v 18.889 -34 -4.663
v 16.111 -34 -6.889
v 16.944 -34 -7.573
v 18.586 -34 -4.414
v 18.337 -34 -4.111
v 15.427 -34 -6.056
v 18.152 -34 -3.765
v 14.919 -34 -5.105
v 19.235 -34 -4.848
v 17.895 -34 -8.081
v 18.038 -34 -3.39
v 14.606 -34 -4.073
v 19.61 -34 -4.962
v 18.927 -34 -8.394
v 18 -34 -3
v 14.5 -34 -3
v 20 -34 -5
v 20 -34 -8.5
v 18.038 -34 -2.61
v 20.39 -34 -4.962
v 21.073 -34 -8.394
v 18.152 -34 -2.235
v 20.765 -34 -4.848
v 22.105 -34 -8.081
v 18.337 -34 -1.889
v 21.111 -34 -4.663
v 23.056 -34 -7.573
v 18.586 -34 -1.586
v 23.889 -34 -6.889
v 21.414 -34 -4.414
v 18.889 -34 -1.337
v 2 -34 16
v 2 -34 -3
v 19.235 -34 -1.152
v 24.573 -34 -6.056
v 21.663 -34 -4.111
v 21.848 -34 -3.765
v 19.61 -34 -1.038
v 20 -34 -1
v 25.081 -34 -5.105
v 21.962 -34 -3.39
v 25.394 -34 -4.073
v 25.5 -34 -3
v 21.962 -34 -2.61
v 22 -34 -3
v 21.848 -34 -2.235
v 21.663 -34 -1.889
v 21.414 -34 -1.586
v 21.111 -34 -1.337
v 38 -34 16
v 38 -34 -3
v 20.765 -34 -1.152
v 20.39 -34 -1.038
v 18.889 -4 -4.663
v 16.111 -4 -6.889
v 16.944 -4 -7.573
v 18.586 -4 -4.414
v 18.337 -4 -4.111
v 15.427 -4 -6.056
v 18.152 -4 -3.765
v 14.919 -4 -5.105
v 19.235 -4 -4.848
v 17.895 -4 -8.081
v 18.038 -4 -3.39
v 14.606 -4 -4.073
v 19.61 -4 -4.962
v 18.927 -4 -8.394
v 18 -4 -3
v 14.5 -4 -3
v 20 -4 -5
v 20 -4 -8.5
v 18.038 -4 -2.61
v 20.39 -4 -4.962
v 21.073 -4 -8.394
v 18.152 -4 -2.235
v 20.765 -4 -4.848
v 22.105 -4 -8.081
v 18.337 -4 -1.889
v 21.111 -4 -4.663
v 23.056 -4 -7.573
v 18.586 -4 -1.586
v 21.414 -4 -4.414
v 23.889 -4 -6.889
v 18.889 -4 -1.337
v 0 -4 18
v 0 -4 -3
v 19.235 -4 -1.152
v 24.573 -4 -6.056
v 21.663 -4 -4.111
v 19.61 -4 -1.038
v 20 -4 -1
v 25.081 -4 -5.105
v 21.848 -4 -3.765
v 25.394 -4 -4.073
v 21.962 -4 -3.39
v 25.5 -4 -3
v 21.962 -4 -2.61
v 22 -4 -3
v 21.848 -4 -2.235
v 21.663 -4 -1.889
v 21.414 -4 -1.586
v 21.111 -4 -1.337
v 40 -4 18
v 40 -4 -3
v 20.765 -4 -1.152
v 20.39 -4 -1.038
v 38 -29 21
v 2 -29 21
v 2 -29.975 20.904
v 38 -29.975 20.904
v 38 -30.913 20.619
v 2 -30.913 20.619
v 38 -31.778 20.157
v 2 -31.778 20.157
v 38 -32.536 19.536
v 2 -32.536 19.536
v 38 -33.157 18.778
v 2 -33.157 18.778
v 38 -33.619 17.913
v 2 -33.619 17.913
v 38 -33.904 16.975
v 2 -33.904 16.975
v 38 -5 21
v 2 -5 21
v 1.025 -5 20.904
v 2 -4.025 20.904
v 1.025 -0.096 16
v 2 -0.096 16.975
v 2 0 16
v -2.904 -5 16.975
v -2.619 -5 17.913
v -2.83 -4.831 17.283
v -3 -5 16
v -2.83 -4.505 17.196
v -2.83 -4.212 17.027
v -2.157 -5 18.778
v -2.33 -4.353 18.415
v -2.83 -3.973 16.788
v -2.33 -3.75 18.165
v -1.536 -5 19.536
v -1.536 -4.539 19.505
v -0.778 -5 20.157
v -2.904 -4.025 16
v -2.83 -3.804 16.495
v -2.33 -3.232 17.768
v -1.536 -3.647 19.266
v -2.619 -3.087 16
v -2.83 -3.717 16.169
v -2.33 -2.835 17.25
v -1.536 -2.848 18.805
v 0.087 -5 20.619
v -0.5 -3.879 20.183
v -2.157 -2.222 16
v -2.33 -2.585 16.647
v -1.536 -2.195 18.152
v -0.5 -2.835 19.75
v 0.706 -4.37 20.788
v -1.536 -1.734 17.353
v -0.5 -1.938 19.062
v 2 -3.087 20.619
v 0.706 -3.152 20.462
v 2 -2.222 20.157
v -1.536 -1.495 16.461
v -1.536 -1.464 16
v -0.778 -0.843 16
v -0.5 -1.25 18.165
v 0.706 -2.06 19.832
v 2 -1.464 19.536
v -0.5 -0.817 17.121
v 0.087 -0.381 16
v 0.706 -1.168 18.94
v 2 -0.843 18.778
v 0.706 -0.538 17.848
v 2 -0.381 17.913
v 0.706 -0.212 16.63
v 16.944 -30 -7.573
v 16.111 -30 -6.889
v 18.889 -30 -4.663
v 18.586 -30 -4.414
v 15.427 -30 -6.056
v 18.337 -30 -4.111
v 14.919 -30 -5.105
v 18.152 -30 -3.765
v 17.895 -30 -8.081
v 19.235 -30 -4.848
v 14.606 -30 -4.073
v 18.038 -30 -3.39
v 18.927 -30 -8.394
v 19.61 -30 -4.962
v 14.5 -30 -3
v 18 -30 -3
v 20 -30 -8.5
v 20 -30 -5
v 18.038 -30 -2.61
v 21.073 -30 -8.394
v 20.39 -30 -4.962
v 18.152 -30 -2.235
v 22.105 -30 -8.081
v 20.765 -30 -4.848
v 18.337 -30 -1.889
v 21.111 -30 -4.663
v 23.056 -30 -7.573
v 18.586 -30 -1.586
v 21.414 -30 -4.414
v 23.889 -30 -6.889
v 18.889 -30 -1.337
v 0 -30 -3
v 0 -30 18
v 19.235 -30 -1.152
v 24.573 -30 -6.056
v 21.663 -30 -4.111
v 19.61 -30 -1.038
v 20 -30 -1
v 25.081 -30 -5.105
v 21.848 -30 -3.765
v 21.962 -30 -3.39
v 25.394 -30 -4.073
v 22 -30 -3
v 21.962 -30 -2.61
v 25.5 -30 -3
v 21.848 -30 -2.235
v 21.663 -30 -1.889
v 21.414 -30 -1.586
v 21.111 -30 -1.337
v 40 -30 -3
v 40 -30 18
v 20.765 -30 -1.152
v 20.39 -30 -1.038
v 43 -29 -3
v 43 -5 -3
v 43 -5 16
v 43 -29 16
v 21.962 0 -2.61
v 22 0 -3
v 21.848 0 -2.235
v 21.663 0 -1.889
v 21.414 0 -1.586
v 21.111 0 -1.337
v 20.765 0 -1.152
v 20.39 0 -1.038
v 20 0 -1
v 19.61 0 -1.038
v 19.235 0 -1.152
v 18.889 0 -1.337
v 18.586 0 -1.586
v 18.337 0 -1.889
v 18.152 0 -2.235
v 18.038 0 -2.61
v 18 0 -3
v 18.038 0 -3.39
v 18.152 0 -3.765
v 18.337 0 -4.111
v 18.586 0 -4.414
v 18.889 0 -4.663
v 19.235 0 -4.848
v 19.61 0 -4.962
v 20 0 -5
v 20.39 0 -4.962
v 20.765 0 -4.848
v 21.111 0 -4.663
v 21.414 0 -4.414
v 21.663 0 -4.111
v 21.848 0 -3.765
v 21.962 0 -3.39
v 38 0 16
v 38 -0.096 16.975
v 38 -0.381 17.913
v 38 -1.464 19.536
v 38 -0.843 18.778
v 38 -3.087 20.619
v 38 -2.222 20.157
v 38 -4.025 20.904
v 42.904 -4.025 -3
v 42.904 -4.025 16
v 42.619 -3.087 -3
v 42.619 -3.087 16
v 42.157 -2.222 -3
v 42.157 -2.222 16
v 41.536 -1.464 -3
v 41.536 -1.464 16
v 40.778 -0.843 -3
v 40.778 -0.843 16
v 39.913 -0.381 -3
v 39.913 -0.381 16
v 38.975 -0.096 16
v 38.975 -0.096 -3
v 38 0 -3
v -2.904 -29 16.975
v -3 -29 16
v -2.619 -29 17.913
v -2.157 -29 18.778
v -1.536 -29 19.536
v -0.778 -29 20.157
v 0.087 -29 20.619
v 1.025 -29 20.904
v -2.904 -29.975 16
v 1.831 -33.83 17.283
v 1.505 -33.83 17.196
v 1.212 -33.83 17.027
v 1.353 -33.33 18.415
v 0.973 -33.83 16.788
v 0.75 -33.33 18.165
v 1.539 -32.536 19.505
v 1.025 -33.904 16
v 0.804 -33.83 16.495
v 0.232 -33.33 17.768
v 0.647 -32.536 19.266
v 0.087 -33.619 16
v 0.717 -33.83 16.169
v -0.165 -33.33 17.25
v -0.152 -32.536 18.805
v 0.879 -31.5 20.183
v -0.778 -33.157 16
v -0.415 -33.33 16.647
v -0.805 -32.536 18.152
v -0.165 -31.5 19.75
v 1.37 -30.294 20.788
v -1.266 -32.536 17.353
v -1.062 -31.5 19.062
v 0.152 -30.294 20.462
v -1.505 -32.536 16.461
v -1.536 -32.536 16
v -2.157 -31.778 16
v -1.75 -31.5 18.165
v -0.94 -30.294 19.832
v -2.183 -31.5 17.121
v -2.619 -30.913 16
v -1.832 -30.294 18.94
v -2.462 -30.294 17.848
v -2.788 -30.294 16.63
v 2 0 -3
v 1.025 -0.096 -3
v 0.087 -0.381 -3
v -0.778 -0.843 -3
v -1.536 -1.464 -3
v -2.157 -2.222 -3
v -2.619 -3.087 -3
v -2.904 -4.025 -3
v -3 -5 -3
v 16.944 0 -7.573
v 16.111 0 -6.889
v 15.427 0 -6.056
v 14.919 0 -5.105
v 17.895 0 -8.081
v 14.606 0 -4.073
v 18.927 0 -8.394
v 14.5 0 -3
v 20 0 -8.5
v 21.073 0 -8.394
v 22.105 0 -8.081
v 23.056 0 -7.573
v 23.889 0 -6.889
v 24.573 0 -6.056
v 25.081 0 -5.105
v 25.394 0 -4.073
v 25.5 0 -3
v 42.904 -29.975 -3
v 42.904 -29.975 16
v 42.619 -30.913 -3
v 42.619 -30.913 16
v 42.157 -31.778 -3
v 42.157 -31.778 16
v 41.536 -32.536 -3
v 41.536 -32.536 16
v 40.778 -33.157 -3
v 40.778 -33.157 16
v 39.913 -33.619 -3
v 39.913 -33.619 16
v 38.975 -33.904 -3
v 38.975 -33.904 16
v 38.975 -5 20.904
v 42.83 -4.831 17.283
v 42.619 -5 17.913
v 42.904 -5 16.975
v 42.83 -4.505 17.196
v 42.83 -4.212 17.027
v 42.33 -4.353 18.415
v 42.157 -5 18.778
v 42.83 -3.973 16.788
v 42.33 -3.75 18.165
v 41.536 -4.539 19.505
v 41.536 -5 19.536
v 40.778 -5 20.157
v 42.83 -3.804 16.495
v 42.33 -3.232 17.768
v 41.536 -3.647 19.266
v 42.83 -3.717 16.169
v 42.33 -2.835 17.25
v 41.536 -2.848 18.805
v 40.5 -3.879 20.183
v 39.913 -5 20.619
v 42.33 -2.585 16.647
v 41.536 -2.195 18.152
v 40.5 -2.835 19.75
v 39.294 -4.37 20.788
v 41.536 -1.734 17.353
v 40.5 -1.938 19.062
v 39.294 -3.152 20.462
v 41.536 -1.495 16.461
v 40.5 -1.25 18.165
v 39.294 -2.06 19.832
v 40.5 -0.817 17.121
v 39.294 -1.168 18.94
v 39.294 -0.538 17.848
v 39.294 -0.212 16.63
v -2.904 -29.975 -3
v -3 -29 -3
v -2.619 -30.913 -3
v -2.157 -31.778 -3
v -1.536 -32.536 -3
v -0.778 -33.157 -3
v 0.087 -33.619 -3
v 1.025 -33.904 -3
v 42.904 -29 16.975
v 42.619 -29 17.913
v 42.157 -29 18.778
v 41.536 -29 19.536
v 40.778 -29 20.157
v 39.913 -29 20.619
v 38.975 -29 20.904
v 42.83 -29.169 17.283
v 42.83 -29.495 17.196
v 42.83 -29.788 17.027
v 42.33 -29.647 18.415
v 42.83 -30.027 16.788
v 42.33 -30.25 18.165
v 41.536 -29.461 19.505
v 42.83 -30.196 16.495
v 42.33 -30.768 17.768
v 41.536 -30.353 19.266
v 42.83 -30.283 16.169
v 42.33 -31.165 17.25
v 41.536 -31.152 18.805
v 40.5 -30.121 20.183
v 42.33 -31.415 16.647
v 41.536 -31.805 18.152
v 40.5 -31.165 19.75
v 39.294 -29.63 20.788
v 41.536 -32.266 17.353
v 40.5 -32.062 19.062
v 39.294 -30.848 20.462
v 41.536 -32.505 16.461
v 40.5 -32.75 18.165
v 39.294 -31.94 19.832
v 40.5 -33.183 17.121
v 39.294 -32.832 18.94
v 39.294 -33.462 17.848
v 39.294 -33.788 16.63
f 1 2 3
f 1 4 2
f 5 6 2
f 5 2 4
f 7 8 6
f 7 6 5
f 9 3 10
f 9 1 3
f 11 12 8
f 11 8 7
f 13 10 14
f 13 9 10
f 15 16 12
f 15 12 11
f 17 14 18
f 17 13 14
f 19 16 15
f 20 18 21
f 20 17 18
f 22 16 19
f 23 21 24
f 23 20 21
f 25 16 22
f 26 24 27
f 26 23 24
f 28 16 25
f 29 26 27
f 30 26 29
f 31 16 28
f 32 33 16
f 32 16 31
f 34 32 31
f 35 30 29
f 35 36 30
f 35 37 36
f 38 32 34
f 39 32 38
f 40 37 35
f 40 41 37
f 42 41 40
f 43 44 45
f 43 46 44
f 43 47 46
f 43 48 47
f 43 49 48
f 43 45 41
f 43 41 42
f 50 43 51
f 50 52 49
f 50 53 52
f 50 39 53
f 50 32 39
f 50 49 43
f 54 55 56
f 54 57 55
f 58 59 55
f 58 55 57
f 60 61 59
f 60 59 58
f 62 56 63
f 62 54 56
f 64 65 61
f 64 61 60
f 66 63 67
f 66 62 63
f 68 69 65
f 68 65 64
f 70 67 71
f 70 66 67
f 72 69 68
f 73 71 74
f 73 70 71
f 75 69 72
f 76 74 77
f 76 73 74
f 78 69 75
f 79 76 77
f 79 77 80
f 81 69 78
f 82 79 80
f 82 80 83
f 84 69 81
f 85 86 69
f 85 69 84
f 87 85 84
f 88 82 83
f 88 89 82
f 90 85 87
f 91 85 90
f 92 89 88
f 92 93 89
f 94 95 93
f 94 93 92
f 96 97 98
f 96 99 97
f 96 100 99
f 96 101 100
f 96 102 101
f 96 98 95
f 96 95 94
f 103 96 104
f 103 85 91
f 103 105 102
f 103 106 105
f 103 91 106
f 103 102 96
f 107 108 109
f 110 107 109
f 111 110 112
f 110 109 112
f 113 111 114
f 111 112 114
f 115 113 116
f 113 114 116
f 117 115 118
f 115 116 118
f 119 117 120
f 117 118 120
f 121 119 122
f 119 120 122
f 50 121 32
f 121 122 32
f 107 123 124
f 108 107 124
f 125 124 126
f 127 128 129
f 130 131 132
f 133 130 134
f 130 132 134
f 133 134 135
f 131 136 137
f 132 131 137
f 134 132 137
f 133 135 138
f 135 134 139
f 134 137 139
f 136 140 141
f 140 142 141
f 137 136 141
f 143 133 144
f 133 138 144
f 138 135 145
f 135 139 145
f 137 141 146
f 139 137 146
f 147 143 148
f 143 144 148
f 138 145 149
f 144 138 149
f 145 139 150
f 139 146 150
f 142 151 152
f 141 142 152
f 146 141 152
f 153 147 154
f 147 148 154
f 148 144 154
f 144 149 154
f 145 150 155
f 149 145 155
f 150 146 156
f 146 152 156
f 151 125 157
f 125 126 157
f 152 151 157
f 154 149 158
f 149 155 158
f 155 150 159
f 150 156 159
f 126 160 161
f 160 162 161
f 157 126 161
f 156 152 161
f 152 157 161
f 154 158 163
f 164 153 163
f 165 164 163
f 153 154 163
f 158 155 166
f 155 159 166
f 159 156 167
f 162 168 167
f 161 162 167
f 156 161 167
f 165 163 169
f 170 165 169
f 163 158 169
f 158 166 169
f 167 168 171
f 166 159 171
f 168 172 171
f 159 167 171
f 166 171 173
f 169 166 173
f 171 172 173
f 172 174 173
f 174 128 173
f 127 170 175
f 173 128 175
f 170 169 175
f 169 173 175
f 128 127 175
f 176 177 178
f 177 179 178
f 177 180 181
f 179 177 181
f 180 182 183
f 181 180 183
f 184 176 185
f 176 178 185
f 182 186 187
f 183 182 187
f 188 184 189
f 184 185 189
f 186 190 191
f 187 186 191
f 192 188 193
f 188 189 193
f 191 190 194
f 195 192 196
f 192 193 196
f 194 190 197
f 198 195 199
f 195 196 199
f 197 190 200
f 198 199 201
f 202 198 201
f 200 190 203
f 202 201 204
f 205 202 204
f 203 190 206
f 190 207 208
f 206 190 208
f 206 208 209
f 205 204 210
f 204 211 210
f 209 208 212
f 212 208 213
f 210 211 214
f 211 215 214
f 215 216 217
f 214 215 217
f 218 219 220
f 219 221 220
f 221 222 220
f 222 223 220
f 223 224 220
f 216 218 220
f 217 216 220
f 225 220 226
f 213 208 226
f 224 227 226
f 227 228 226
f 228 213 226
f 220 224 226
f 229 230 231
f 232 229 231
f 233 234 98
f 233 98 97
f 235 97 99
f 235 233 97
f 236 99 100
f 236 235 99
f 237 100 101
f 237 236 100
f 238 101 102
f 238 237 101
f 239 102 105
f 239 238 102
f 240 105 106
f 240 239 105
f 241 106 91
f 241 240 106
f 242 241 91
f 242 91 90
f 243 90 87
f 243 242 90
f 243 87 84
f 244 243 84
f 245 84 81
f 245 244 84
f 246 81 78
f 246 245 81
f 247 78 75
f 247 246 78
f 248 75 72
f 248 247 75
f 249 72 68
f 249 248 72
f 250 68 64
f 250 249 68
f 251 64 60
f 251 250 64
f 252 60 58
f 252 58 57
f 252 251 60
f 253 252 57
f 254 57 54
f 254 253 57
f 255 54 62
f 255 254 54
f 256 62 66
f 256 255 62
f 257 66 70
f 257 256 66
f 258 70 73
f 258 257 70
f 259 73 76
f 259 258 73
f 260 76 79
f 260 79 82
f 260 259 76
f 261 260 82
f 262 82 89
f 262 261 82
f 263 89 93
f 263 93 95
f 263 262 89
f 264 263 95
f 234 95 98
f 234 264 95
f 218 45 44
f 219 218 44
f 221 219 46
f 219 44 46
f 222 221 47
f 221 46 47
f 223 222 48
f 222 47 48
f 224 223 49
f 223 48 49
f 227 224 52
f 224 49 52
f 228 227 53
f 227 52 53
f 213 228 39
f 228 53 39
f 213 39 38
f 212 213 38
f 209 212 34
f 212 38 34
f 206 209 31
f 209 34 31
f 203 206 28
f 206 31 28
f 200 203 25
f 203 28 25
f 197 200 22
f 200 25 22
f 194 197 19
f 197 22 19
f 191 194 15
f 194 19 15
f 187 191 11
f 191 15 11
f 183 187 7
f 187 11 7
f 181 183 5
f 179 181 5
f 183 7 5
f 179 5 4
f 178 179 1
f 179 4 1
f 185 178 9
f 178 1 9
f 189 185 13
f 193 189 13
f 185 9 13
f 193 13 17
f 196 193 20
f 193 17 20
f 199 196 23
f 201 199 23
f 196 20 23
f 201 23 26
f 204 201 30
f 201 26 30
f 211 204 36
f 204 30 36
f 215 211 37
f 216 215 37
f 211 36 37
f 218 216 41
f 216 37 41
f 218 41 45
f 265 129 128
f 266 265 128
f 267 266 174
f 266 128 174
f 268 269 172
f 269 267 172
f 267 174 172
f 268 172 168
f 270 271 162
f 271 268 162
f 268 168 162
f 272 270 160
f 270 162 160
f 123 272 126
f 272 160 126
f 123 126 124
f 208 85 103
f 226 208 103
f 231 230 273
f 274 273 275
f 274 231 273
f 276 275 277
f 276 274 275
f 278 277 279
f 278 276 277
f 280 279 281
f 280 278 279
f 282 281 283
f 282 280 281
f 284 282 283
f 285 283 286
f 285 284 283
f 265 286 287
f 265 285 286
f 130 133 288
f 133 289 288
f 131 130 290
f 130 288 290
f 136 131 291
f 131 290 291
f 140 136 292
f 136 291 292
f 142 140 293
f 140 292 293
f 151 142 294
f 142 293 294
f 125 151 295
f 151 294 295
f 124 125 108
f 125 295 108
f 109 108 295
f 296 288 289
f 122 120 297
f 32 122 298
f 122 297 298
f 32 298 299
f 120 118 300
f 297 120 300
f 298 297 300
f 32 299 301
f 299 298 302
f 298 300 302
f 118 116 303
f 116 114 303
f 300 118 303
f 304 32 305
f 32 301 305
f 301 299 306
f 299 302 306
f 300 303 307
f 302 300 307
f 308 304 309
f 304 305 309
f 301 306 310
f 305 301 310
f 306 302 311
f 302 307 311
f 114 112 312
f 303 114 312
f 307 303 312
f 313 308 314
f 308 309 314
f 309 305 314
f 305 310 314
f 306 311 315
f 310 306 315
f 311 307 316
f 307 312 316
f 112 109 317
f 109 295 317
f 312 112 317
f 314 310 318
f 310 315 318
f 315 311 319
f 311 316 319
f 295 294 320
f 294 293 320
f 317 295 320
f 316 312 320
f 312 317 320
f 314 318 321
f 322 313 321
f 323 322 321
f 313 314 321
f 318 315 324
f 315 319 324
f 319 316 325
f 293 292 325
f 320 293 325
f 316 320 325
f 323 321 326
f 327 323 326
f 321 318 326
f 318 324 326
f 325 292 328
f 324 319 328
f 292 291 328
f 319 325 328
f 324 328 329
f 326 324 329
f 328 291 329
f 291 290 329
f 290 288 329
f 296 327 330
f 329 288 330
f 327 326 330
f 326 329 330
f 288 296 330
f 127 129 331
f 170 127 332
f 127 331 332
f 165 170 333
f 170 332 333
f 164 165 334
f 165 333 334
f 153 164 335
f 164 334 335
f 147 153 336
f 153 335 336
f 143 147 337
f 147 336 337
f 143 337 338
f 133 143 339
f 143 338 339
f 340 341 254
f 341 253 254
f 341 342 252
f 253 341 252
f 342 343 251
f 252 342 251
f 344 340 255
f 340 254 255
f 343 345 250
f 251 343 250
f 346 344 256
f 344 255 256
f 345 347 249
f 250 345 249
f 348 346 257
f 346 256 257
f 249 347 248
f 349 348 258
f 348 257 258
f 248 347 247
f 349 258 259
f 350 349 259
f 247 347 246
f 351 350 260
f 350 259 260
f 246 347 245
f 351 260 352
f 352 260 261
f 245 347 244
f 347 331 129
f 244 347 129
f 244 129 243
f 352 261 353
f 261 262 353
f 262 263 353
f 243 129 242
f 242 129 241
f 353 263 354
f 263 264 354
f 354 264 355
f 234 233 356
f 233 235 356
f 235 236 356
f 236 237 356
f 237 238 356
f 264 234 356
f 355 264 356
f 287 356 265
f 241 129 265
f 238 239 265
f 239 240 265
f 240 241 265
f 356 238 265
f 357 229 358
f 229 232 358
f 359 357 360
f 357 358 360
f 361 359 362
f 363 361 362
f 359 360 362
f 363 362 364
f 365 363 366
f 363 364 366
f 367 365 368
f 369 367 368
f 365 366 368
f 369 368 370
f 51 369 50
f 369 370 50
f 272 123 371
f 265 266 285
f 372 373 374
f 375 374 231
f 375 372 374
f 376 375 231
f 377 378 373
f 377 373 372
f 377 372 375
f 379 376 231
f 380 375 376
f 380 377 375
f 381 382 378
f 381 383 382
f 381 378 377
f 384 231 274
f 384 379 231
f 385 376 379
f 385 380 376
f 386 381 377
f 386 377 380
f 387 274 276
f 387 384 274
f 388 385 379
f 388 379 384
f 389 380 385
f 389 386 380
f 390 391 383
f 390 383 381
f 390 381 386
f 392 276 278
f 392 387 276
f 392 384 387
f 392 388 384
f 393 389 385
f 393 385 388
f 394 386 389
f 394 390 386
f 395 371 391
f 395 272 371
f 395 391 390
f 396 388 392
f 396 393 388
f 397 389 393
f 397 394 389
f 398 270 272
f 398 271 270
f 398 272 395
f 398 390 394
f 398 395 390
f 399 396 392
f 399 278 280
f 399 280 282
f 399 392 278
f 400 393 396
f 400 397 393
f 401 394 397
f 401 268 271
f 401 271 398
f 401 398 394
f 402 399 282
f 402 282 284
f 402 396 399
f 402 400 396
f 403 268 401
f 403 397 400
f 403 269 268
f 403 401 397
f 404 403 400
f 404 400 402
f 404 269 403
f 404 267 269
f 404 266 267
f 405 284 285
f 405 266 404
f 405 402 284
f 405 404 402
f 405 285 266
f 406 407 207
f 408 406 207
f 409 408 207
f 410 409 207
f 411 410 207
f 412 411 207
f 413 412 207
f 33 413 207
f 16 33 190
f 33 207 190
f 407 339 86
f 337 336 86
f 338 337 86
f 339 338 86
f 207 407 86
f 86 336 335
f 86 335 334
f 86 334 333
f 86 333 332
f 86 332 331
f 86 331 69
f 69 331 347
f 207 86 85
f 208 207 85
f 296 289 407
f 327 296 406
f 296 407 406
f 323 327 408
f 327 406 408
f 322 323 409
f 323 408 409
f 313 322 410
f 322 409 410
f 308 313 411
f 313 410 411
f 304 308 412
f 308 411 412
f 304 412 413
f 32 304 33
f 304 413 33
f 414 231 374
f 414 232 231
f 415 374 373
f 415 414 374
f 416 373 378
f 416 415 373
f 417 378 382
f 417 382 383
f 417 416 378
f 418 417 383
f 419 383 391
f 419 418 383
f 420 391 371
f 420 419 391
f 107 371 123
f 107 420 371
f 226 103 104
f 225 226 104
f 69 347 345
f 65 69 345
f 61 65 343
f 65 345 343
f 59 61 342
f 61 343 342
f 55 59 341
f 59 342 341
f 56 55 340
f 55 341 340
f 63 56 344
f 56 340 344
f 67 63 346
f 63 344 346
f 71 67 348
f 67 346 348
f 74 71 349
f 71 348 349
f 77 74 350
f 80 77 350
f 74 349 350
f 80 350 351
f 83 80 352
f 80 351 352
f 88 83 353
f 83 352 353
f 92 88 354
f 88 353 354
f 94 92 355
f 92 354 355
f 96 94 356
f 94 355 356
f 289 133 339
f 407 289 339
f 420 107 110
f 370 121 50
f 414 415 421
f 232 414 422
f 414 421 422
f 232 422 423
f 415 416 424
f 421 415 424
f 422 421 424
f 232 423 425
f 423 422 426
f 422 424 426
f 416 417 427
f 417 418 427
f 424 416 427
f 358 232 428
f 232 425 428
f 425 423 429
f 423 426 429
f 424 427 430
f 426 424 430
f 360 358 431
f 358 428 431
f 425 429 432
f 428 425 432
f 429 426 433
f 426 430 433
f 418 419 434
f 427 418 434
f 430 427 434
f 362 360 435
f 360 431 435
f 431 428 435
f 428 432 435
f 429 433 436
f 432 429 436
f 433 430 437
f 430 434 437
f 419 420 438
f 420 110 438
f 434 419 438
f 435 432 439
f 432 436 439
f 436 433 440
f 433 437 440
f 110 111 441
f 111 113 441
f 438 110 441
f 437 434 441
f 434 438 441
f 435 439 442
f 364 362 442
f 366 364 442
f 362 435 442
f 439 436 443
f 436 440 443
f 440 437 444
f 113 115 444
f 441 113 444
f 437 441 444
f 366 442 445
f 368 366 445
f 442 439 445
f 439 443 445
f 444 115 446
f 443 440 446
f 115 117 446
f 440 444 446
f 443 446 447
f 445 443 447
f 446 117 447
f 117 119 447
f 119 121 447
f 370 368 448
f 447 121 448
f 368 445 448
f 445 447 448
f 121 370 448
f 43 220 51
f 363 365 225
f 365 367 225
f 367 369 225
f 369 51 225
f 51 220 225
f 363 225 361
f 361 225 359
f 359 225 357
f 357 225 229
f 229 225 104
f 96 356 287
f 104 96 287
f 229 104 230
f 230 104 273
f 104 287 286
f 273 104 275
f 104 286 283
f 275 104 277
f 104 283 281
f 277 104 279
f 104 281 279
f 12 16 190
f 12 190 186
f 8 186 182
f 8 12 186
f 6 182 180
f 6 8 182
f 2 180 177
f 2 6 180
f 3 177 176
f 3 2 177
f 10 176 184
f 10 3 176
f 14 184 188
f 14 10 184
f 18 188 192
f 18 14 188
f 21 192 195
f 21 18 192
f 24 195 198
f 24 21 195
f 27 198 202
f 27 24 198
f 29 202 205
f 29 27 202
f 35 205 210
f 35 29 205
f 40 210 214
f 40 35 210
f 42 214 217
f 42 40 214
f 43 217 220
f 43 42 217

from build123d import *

# Parameters (mm, degrees)
F0_R     = 2
F1_DEPTH = 4
F2_DEPTH = 34
F5_R     = 5


with BuildPart() as f1:
    # F0 (on Front) → F1 (new body)
    with BuildSketch(Plane.XZ):
        Polygon((0, 0), (0, 18), (40, 18), (40, 0), (40, -3), (43, -3), (43, 21), (-3, 21), (-3, -3), (0, -3), align=None)
        with BuildLine():
            Line((40, 18), (0, 18))
            Line((0, 18), (0, 0))
            Line((0, 0), (0, -3))
            Line((0, -3), (14.5, -3))
            ThreePointArc((14.5, -3), (20, -8.5), (25.5, -3))
            Line((25.5, -3), (40, -3))
            Line((40, -3), (40, 0))
            Line((40, 0), (40, 18))
        make_face()
        with Locations((20, -3)):
            Circle(F0_R, mode=Mode.SUBTRACT)
    extrude(amount=F1_DEPTH)

    # F0 (on Front) → F2 (join)
    with BuildSketch(Plane.XZ):
        Polygon((0, 0), (0, 18), (40, 18), (40, 0), (40, -3), (43, -3), (43, 21), (-3, 21), (-3, -3), (0, -3), align=None)
    extrude(amount=F2_DEPTH)

    # F4: F1 across plane


with BuildPart() as f1_1:
    add(f1.part)
    add(f1.part.mirror(Plane.XZ.offset(17)))

    # F5
    f5_edges = [f1_1.edges().sort_by_distance(p)[0] for p in [
        (20, 0, 21),
        (-3, -17, 21),
        (20, -34, 21),
        (43, -17, 21),
        (43, 0, 9),
        (-3, 0, 9),
        (-3, -34, 9),
        (43, -34, 9),
    ]]
    fillet(f5_edges, radius=F5_R)


solid = f1_1.part
